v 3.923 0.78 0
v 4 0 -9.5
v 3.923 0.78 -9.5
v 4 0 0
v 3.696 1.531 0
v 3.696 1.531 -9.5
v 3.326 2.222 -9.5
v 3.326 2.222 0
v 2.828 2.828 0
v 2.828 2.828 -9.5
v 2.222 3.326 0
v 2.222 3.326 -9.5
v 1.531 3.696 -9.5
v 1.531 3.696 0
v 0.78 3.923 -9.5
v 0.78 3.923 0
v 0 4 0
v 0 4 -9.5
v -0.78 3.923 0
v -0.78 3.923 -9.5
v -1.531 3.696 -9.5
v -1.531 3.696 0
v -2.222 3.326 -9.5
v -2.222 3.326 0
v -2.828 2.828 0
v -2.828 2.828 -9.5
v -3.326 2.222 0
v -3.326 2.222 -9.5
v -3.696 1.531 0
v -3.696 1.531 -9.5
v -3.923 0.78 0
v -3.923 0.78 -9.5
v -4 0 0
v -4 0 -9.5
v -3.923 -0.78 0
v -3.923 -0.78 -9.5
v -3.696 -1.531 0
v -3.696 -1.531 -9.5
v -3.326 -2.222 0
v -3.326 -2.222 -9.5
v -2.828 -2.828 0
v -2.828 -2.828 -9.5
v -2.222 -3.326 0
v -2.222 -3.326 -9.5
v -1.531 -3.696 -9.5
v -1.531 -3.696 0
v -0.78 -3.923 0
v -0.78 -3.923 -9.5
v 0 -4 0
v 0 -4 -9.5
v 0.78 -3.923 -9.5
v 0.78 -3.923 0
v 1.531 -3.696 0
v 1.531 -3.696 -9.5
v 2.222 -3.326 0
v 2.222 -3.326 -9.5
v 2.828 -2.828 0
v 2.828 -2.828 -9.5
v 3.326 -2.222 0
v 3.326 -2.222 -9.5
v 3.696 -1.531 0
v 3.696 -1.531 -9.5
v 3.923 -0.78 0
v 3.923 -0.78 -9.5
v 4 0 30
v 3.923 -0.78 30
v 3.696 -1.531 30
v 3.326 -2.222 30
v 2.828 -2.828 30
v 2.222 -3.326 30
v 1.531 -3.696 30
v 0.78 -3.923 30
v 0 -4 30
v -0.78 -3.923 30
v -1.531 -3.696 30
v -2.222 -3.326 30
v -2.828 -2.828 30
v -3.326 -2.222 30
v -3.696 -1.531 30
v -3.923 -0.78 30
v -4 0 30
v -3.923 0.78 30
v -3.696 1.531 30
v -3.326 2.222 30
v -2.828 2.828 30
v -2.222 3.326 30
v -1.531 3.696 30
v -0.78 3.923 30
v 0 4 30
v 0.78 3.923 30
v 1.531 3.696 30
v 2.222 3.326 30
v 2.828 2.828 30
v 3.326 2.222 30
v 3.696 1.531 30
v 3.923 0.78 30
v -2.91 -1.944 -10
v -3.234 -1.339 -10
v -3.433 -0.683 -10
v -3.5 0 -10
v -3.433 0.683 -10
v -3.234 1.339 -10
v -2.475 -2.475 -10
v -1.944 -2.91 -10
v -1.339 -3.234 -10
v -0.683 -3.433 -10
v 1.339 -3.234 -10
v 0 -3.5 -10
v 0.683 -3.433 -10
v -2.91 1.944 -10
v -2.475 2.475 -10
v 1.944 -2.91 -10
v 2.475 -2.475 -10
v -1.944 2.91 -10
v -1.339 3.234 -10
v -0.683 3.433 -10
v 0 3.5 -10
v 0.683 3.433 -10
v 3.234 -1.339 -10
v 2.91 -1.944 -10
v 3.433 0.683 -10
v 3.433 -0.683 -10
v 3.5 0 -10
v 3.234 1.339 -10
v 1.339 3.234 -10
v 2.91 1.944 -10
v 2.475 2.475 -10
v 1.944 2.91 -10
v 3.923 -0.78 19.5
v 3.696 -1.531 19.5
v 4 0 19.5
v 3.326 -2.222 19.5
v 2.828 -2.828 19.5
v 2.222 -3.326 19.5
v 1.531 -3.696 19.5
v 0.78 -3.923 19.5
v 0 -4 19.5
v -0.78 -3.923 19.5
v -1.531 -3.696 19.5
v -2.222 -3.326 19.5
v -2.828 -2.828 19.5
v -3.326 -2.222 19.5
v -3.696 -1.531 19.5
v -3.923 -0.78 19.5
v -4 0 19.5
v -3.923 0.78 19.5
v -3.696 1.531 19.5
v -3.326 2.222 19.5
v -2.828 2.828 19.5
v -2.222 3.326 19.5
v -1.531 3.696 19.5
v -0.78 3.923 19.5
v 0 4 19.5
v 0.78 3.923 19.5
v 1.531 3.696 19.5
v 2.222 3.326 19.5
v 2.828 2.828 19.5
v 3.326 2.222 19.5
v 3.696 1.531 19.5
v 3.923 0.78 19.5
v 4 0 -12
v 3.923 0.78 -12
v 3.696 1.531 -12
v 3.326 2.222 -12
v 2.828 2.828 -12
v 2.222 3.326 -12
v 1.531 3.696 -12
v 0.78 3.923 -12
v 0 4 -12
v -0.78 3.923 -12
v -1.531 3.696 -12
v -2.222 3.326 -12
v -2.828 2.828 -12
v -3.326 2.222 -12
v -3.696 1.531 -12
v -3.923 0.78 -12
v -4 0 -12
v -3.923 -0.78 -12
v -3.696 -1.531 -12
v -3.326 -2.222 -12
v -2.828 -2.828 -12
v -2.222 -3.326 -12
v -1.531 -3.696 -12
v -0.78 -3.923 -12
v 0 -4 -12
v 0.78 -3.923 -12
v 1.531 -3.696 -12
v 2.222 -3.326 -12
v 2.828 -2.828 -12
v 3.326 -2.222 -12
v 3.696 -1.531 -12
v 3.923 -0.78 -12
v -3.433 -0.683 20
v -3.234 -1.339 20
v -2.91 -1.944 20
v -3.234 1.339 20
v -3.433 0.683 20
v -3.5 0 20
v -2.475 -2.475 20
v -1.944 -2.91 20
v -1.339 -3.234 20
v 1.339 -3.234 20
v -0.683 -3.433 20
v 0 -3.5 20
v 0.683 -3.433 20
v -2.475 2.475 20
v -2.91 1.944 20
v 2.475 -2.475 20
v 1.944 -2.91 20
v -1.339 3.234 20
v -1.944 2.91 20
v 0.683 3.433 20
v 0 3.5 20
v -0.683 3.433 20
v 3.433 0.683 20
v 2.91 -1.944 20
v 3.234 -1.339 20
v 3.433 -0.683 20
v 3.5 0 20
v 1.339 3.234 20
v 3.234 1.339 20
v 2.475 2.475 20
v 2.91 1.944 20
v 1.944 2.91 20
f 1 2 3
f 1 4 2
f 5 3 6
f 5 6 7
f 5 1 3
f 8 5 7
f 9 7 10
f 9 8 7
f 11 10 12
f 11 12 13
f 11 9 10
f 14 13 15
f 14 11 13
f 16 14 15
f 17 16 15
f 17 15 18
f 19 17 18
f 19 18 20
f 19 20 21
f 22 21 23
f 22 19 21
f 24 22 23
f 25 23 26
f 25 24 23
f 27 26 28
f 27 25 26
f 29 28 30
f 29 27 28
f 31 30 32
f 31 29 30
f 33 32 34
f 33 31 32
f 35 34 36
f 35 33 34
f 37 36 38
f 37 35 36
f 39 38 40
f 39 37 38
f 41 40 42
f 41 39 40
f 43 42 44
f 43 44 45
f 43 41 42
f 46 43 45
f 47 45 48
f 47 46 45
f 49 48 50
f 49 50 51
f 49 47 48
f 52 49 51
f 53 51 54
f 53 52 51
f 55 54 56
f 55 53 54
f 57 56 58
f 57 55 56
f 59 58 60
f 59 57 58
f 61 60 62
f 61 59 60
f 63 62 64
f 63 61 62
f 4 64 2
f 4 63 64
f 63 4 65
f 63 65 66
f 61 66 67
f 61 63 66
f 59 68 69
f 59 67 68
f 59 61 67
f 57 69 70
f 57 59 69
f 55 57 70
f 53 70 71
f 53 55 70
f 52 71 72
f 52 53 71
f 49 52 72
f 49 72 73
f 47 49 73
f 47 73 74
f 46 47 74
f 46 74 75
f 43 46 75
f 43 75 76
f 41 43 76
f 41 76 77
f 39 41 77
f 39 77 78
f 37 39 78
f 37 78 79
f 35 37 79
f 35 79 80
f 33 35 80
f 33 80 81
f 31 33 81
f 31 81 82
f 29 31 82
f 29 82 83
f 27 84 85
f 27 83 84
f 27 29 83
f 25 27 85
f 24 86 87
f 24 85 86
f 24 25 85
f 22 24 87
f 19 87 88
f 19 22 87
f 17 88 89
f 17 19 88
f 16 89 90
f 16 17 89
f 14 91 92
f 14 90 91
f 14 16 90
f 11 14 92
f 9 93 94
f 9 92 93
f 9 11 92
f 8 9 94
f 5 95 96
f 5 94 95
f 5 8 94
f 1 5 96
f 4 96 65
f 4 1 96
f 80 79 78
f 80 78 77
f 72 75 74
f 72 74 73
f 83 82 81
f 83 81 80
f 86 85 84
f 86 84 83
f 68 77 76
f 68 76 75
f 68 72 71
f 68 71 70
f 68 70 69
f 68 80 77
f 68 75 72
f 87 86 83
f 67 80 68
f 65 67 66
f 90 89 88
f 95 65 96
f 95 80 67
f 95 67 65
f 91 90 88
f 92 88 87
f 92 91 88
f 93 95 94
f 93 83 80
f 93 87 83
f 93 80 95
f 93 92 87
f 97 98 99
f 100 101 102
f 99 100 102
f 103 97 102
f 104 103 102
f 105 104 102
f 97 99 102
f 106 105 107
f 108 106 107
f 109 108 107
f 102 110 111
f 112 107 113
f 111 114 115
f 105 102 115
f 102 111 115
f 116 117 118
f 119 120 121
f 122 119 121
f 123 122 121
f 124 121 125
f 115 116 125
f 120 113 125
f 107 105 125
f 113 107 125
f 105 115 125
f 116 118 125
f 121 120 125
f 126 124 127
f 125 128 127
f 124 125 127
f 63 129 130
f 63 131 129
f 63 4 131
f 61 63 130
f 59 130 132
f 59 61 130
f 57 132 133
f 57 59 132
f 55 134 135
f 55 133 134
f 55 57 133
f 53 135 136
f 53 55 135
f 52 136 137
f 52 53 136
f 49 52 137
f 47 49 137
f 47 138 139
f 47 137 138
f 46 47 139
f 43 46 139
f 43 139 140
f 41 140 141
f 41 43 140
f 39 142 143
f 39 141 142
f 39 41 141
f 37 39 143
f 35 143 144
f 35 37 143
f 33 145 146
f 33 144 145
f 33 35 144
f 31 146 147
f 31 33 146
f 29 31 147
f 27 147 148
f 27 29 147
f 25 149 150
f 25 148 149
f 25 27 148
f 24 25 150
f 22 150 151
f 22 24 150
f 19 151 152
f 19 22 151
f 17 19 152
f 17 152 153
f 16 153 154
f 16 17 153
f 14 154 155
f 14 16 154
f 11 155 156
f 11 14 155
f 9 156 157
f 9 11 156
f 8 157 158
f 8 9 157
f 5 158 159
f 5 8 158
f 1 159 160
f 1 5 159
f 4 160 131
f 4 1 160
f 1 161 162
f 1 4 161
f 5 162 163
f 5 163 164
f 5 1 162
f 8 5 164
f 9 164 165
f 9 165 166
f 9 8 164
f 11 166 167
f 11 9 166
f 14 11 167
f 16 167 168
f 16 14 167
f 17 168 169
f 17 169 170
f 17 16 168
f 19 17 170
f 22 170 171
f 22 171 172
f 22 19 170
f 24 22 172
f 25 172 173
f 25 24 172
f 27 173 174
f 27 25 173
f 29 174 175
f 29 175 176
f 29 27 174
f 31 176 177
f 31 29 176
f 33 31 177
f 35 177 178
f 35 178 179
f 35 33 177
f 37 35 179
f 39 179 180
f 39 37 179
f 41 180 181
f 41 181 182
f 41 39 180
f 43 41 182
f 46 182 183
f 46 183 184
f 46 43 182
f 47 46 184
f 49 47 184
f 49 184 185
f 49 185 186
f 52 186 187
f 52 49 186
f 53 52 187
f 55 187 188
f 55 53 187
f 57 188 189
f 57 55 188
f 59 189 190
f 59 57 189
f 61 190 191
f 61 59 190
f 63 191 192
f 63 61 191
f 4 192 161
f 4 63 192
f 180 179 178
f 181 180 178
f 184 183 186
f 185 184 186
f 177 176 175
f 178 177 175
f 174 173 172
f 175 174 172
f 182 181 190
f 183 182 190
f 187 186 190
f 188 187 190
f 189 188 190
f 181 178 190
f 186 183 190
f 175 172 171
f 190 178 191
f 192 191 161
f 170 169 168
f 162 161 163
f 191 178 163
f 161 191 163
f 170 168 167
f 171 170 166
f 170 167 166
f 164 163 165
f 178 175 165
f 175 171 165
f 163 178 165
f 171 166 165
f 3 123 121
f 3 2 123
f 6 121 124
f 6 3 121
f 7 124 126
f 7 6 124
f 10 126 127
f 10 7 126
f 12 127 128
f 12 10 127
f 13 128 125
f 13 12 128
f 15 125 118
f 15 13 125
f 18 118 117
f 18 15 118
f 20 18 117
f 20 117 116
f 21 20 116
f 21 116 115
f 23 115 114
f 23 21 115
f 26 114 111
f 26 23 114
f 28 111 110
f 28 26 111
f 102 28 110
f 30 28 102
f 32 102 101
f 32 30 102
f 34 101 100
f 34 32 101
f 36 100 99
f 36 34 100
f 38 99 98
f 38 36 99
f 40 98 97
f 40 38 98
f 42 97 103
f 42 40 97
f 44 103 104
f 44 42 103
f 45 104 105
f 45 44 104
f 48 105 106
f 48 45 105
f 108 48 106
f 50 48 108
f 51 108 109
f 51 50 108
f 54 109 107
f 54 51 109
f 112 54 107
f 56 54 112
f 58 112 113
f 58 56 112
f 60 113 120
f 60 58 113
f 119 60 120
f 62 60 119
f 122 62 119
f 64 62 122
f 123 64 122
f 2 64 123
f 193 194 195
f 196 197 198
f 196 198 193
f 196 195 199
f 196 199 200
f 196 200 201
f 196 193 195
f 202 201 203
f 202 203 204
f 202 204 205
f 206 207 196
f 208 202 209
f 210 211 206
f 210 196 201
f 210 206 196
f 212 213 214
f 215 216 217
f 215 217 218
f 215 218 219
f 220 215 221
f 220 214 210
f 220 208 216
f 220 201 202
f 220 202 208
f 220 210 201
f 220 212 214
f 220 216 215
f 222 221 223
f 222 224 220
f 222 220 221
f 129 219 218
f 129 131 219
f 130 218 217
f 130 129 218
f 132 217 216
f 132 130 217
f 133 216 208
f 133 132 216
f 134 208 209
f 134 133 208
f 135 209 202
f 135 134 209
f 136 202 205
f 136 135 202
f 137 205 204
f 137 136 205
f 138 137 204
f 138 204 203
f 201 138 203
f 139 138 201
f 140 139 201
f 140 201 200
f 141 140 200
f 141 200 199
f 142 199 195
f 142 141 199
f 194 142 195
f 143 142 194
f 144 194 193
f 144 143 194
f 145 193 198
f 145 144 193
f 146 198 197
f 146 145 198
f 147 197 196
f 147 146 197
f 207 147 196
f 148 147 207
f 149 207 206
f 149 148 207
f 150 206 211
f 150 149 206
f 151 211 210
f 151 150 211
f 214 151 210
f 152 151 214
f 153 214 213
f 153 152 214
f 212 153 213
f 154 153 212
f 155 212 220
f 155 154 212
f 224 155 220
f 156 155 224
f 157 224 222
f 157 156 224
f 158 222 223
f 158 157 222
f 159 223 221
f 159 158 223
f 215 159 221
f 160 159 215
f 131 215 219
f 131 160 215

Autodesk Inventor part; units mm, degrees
ref_plane "YZ Plane" through (0, 0, 0) normal (1, 0, 0) x (0, 1, 0)
ref_plane "XZ Plane" through (0, 0, 0) normal (0, 1, 0) x (-1, 0, 0)
ref_plane "XY Plane" through (0, 0, 0) normal (0, 0, 1) x (1, 0, 0)
sketch "Sketch1" plane through (0, 0, 0) normal (0, 0, 1) x (1, 0, 0)
  circle A0 centre (0, 0) radius 4
  dimension "D" = 8
extrude "Extrusion1" add sketch "Sketch1" along normal blind 20 and the other way blind 10
chamfer "Chamfer1" distance 0.5 angle 45 2 edges at (-4, 0, 20) (-4, 0, -10)
sketch "Sketch2" plane through (0, 0, 0) normal (0, 0, 1) x (1, 0, 0)
  circle A0 centre (0, 0) radius 4
  dimension "d8" = 8
extrude "Extrusion2" add sketch "Sketch2" along normal blind 30 and the other way blind 12 separate body
properties part number "Dowel 30x8" material "TMB 01"
